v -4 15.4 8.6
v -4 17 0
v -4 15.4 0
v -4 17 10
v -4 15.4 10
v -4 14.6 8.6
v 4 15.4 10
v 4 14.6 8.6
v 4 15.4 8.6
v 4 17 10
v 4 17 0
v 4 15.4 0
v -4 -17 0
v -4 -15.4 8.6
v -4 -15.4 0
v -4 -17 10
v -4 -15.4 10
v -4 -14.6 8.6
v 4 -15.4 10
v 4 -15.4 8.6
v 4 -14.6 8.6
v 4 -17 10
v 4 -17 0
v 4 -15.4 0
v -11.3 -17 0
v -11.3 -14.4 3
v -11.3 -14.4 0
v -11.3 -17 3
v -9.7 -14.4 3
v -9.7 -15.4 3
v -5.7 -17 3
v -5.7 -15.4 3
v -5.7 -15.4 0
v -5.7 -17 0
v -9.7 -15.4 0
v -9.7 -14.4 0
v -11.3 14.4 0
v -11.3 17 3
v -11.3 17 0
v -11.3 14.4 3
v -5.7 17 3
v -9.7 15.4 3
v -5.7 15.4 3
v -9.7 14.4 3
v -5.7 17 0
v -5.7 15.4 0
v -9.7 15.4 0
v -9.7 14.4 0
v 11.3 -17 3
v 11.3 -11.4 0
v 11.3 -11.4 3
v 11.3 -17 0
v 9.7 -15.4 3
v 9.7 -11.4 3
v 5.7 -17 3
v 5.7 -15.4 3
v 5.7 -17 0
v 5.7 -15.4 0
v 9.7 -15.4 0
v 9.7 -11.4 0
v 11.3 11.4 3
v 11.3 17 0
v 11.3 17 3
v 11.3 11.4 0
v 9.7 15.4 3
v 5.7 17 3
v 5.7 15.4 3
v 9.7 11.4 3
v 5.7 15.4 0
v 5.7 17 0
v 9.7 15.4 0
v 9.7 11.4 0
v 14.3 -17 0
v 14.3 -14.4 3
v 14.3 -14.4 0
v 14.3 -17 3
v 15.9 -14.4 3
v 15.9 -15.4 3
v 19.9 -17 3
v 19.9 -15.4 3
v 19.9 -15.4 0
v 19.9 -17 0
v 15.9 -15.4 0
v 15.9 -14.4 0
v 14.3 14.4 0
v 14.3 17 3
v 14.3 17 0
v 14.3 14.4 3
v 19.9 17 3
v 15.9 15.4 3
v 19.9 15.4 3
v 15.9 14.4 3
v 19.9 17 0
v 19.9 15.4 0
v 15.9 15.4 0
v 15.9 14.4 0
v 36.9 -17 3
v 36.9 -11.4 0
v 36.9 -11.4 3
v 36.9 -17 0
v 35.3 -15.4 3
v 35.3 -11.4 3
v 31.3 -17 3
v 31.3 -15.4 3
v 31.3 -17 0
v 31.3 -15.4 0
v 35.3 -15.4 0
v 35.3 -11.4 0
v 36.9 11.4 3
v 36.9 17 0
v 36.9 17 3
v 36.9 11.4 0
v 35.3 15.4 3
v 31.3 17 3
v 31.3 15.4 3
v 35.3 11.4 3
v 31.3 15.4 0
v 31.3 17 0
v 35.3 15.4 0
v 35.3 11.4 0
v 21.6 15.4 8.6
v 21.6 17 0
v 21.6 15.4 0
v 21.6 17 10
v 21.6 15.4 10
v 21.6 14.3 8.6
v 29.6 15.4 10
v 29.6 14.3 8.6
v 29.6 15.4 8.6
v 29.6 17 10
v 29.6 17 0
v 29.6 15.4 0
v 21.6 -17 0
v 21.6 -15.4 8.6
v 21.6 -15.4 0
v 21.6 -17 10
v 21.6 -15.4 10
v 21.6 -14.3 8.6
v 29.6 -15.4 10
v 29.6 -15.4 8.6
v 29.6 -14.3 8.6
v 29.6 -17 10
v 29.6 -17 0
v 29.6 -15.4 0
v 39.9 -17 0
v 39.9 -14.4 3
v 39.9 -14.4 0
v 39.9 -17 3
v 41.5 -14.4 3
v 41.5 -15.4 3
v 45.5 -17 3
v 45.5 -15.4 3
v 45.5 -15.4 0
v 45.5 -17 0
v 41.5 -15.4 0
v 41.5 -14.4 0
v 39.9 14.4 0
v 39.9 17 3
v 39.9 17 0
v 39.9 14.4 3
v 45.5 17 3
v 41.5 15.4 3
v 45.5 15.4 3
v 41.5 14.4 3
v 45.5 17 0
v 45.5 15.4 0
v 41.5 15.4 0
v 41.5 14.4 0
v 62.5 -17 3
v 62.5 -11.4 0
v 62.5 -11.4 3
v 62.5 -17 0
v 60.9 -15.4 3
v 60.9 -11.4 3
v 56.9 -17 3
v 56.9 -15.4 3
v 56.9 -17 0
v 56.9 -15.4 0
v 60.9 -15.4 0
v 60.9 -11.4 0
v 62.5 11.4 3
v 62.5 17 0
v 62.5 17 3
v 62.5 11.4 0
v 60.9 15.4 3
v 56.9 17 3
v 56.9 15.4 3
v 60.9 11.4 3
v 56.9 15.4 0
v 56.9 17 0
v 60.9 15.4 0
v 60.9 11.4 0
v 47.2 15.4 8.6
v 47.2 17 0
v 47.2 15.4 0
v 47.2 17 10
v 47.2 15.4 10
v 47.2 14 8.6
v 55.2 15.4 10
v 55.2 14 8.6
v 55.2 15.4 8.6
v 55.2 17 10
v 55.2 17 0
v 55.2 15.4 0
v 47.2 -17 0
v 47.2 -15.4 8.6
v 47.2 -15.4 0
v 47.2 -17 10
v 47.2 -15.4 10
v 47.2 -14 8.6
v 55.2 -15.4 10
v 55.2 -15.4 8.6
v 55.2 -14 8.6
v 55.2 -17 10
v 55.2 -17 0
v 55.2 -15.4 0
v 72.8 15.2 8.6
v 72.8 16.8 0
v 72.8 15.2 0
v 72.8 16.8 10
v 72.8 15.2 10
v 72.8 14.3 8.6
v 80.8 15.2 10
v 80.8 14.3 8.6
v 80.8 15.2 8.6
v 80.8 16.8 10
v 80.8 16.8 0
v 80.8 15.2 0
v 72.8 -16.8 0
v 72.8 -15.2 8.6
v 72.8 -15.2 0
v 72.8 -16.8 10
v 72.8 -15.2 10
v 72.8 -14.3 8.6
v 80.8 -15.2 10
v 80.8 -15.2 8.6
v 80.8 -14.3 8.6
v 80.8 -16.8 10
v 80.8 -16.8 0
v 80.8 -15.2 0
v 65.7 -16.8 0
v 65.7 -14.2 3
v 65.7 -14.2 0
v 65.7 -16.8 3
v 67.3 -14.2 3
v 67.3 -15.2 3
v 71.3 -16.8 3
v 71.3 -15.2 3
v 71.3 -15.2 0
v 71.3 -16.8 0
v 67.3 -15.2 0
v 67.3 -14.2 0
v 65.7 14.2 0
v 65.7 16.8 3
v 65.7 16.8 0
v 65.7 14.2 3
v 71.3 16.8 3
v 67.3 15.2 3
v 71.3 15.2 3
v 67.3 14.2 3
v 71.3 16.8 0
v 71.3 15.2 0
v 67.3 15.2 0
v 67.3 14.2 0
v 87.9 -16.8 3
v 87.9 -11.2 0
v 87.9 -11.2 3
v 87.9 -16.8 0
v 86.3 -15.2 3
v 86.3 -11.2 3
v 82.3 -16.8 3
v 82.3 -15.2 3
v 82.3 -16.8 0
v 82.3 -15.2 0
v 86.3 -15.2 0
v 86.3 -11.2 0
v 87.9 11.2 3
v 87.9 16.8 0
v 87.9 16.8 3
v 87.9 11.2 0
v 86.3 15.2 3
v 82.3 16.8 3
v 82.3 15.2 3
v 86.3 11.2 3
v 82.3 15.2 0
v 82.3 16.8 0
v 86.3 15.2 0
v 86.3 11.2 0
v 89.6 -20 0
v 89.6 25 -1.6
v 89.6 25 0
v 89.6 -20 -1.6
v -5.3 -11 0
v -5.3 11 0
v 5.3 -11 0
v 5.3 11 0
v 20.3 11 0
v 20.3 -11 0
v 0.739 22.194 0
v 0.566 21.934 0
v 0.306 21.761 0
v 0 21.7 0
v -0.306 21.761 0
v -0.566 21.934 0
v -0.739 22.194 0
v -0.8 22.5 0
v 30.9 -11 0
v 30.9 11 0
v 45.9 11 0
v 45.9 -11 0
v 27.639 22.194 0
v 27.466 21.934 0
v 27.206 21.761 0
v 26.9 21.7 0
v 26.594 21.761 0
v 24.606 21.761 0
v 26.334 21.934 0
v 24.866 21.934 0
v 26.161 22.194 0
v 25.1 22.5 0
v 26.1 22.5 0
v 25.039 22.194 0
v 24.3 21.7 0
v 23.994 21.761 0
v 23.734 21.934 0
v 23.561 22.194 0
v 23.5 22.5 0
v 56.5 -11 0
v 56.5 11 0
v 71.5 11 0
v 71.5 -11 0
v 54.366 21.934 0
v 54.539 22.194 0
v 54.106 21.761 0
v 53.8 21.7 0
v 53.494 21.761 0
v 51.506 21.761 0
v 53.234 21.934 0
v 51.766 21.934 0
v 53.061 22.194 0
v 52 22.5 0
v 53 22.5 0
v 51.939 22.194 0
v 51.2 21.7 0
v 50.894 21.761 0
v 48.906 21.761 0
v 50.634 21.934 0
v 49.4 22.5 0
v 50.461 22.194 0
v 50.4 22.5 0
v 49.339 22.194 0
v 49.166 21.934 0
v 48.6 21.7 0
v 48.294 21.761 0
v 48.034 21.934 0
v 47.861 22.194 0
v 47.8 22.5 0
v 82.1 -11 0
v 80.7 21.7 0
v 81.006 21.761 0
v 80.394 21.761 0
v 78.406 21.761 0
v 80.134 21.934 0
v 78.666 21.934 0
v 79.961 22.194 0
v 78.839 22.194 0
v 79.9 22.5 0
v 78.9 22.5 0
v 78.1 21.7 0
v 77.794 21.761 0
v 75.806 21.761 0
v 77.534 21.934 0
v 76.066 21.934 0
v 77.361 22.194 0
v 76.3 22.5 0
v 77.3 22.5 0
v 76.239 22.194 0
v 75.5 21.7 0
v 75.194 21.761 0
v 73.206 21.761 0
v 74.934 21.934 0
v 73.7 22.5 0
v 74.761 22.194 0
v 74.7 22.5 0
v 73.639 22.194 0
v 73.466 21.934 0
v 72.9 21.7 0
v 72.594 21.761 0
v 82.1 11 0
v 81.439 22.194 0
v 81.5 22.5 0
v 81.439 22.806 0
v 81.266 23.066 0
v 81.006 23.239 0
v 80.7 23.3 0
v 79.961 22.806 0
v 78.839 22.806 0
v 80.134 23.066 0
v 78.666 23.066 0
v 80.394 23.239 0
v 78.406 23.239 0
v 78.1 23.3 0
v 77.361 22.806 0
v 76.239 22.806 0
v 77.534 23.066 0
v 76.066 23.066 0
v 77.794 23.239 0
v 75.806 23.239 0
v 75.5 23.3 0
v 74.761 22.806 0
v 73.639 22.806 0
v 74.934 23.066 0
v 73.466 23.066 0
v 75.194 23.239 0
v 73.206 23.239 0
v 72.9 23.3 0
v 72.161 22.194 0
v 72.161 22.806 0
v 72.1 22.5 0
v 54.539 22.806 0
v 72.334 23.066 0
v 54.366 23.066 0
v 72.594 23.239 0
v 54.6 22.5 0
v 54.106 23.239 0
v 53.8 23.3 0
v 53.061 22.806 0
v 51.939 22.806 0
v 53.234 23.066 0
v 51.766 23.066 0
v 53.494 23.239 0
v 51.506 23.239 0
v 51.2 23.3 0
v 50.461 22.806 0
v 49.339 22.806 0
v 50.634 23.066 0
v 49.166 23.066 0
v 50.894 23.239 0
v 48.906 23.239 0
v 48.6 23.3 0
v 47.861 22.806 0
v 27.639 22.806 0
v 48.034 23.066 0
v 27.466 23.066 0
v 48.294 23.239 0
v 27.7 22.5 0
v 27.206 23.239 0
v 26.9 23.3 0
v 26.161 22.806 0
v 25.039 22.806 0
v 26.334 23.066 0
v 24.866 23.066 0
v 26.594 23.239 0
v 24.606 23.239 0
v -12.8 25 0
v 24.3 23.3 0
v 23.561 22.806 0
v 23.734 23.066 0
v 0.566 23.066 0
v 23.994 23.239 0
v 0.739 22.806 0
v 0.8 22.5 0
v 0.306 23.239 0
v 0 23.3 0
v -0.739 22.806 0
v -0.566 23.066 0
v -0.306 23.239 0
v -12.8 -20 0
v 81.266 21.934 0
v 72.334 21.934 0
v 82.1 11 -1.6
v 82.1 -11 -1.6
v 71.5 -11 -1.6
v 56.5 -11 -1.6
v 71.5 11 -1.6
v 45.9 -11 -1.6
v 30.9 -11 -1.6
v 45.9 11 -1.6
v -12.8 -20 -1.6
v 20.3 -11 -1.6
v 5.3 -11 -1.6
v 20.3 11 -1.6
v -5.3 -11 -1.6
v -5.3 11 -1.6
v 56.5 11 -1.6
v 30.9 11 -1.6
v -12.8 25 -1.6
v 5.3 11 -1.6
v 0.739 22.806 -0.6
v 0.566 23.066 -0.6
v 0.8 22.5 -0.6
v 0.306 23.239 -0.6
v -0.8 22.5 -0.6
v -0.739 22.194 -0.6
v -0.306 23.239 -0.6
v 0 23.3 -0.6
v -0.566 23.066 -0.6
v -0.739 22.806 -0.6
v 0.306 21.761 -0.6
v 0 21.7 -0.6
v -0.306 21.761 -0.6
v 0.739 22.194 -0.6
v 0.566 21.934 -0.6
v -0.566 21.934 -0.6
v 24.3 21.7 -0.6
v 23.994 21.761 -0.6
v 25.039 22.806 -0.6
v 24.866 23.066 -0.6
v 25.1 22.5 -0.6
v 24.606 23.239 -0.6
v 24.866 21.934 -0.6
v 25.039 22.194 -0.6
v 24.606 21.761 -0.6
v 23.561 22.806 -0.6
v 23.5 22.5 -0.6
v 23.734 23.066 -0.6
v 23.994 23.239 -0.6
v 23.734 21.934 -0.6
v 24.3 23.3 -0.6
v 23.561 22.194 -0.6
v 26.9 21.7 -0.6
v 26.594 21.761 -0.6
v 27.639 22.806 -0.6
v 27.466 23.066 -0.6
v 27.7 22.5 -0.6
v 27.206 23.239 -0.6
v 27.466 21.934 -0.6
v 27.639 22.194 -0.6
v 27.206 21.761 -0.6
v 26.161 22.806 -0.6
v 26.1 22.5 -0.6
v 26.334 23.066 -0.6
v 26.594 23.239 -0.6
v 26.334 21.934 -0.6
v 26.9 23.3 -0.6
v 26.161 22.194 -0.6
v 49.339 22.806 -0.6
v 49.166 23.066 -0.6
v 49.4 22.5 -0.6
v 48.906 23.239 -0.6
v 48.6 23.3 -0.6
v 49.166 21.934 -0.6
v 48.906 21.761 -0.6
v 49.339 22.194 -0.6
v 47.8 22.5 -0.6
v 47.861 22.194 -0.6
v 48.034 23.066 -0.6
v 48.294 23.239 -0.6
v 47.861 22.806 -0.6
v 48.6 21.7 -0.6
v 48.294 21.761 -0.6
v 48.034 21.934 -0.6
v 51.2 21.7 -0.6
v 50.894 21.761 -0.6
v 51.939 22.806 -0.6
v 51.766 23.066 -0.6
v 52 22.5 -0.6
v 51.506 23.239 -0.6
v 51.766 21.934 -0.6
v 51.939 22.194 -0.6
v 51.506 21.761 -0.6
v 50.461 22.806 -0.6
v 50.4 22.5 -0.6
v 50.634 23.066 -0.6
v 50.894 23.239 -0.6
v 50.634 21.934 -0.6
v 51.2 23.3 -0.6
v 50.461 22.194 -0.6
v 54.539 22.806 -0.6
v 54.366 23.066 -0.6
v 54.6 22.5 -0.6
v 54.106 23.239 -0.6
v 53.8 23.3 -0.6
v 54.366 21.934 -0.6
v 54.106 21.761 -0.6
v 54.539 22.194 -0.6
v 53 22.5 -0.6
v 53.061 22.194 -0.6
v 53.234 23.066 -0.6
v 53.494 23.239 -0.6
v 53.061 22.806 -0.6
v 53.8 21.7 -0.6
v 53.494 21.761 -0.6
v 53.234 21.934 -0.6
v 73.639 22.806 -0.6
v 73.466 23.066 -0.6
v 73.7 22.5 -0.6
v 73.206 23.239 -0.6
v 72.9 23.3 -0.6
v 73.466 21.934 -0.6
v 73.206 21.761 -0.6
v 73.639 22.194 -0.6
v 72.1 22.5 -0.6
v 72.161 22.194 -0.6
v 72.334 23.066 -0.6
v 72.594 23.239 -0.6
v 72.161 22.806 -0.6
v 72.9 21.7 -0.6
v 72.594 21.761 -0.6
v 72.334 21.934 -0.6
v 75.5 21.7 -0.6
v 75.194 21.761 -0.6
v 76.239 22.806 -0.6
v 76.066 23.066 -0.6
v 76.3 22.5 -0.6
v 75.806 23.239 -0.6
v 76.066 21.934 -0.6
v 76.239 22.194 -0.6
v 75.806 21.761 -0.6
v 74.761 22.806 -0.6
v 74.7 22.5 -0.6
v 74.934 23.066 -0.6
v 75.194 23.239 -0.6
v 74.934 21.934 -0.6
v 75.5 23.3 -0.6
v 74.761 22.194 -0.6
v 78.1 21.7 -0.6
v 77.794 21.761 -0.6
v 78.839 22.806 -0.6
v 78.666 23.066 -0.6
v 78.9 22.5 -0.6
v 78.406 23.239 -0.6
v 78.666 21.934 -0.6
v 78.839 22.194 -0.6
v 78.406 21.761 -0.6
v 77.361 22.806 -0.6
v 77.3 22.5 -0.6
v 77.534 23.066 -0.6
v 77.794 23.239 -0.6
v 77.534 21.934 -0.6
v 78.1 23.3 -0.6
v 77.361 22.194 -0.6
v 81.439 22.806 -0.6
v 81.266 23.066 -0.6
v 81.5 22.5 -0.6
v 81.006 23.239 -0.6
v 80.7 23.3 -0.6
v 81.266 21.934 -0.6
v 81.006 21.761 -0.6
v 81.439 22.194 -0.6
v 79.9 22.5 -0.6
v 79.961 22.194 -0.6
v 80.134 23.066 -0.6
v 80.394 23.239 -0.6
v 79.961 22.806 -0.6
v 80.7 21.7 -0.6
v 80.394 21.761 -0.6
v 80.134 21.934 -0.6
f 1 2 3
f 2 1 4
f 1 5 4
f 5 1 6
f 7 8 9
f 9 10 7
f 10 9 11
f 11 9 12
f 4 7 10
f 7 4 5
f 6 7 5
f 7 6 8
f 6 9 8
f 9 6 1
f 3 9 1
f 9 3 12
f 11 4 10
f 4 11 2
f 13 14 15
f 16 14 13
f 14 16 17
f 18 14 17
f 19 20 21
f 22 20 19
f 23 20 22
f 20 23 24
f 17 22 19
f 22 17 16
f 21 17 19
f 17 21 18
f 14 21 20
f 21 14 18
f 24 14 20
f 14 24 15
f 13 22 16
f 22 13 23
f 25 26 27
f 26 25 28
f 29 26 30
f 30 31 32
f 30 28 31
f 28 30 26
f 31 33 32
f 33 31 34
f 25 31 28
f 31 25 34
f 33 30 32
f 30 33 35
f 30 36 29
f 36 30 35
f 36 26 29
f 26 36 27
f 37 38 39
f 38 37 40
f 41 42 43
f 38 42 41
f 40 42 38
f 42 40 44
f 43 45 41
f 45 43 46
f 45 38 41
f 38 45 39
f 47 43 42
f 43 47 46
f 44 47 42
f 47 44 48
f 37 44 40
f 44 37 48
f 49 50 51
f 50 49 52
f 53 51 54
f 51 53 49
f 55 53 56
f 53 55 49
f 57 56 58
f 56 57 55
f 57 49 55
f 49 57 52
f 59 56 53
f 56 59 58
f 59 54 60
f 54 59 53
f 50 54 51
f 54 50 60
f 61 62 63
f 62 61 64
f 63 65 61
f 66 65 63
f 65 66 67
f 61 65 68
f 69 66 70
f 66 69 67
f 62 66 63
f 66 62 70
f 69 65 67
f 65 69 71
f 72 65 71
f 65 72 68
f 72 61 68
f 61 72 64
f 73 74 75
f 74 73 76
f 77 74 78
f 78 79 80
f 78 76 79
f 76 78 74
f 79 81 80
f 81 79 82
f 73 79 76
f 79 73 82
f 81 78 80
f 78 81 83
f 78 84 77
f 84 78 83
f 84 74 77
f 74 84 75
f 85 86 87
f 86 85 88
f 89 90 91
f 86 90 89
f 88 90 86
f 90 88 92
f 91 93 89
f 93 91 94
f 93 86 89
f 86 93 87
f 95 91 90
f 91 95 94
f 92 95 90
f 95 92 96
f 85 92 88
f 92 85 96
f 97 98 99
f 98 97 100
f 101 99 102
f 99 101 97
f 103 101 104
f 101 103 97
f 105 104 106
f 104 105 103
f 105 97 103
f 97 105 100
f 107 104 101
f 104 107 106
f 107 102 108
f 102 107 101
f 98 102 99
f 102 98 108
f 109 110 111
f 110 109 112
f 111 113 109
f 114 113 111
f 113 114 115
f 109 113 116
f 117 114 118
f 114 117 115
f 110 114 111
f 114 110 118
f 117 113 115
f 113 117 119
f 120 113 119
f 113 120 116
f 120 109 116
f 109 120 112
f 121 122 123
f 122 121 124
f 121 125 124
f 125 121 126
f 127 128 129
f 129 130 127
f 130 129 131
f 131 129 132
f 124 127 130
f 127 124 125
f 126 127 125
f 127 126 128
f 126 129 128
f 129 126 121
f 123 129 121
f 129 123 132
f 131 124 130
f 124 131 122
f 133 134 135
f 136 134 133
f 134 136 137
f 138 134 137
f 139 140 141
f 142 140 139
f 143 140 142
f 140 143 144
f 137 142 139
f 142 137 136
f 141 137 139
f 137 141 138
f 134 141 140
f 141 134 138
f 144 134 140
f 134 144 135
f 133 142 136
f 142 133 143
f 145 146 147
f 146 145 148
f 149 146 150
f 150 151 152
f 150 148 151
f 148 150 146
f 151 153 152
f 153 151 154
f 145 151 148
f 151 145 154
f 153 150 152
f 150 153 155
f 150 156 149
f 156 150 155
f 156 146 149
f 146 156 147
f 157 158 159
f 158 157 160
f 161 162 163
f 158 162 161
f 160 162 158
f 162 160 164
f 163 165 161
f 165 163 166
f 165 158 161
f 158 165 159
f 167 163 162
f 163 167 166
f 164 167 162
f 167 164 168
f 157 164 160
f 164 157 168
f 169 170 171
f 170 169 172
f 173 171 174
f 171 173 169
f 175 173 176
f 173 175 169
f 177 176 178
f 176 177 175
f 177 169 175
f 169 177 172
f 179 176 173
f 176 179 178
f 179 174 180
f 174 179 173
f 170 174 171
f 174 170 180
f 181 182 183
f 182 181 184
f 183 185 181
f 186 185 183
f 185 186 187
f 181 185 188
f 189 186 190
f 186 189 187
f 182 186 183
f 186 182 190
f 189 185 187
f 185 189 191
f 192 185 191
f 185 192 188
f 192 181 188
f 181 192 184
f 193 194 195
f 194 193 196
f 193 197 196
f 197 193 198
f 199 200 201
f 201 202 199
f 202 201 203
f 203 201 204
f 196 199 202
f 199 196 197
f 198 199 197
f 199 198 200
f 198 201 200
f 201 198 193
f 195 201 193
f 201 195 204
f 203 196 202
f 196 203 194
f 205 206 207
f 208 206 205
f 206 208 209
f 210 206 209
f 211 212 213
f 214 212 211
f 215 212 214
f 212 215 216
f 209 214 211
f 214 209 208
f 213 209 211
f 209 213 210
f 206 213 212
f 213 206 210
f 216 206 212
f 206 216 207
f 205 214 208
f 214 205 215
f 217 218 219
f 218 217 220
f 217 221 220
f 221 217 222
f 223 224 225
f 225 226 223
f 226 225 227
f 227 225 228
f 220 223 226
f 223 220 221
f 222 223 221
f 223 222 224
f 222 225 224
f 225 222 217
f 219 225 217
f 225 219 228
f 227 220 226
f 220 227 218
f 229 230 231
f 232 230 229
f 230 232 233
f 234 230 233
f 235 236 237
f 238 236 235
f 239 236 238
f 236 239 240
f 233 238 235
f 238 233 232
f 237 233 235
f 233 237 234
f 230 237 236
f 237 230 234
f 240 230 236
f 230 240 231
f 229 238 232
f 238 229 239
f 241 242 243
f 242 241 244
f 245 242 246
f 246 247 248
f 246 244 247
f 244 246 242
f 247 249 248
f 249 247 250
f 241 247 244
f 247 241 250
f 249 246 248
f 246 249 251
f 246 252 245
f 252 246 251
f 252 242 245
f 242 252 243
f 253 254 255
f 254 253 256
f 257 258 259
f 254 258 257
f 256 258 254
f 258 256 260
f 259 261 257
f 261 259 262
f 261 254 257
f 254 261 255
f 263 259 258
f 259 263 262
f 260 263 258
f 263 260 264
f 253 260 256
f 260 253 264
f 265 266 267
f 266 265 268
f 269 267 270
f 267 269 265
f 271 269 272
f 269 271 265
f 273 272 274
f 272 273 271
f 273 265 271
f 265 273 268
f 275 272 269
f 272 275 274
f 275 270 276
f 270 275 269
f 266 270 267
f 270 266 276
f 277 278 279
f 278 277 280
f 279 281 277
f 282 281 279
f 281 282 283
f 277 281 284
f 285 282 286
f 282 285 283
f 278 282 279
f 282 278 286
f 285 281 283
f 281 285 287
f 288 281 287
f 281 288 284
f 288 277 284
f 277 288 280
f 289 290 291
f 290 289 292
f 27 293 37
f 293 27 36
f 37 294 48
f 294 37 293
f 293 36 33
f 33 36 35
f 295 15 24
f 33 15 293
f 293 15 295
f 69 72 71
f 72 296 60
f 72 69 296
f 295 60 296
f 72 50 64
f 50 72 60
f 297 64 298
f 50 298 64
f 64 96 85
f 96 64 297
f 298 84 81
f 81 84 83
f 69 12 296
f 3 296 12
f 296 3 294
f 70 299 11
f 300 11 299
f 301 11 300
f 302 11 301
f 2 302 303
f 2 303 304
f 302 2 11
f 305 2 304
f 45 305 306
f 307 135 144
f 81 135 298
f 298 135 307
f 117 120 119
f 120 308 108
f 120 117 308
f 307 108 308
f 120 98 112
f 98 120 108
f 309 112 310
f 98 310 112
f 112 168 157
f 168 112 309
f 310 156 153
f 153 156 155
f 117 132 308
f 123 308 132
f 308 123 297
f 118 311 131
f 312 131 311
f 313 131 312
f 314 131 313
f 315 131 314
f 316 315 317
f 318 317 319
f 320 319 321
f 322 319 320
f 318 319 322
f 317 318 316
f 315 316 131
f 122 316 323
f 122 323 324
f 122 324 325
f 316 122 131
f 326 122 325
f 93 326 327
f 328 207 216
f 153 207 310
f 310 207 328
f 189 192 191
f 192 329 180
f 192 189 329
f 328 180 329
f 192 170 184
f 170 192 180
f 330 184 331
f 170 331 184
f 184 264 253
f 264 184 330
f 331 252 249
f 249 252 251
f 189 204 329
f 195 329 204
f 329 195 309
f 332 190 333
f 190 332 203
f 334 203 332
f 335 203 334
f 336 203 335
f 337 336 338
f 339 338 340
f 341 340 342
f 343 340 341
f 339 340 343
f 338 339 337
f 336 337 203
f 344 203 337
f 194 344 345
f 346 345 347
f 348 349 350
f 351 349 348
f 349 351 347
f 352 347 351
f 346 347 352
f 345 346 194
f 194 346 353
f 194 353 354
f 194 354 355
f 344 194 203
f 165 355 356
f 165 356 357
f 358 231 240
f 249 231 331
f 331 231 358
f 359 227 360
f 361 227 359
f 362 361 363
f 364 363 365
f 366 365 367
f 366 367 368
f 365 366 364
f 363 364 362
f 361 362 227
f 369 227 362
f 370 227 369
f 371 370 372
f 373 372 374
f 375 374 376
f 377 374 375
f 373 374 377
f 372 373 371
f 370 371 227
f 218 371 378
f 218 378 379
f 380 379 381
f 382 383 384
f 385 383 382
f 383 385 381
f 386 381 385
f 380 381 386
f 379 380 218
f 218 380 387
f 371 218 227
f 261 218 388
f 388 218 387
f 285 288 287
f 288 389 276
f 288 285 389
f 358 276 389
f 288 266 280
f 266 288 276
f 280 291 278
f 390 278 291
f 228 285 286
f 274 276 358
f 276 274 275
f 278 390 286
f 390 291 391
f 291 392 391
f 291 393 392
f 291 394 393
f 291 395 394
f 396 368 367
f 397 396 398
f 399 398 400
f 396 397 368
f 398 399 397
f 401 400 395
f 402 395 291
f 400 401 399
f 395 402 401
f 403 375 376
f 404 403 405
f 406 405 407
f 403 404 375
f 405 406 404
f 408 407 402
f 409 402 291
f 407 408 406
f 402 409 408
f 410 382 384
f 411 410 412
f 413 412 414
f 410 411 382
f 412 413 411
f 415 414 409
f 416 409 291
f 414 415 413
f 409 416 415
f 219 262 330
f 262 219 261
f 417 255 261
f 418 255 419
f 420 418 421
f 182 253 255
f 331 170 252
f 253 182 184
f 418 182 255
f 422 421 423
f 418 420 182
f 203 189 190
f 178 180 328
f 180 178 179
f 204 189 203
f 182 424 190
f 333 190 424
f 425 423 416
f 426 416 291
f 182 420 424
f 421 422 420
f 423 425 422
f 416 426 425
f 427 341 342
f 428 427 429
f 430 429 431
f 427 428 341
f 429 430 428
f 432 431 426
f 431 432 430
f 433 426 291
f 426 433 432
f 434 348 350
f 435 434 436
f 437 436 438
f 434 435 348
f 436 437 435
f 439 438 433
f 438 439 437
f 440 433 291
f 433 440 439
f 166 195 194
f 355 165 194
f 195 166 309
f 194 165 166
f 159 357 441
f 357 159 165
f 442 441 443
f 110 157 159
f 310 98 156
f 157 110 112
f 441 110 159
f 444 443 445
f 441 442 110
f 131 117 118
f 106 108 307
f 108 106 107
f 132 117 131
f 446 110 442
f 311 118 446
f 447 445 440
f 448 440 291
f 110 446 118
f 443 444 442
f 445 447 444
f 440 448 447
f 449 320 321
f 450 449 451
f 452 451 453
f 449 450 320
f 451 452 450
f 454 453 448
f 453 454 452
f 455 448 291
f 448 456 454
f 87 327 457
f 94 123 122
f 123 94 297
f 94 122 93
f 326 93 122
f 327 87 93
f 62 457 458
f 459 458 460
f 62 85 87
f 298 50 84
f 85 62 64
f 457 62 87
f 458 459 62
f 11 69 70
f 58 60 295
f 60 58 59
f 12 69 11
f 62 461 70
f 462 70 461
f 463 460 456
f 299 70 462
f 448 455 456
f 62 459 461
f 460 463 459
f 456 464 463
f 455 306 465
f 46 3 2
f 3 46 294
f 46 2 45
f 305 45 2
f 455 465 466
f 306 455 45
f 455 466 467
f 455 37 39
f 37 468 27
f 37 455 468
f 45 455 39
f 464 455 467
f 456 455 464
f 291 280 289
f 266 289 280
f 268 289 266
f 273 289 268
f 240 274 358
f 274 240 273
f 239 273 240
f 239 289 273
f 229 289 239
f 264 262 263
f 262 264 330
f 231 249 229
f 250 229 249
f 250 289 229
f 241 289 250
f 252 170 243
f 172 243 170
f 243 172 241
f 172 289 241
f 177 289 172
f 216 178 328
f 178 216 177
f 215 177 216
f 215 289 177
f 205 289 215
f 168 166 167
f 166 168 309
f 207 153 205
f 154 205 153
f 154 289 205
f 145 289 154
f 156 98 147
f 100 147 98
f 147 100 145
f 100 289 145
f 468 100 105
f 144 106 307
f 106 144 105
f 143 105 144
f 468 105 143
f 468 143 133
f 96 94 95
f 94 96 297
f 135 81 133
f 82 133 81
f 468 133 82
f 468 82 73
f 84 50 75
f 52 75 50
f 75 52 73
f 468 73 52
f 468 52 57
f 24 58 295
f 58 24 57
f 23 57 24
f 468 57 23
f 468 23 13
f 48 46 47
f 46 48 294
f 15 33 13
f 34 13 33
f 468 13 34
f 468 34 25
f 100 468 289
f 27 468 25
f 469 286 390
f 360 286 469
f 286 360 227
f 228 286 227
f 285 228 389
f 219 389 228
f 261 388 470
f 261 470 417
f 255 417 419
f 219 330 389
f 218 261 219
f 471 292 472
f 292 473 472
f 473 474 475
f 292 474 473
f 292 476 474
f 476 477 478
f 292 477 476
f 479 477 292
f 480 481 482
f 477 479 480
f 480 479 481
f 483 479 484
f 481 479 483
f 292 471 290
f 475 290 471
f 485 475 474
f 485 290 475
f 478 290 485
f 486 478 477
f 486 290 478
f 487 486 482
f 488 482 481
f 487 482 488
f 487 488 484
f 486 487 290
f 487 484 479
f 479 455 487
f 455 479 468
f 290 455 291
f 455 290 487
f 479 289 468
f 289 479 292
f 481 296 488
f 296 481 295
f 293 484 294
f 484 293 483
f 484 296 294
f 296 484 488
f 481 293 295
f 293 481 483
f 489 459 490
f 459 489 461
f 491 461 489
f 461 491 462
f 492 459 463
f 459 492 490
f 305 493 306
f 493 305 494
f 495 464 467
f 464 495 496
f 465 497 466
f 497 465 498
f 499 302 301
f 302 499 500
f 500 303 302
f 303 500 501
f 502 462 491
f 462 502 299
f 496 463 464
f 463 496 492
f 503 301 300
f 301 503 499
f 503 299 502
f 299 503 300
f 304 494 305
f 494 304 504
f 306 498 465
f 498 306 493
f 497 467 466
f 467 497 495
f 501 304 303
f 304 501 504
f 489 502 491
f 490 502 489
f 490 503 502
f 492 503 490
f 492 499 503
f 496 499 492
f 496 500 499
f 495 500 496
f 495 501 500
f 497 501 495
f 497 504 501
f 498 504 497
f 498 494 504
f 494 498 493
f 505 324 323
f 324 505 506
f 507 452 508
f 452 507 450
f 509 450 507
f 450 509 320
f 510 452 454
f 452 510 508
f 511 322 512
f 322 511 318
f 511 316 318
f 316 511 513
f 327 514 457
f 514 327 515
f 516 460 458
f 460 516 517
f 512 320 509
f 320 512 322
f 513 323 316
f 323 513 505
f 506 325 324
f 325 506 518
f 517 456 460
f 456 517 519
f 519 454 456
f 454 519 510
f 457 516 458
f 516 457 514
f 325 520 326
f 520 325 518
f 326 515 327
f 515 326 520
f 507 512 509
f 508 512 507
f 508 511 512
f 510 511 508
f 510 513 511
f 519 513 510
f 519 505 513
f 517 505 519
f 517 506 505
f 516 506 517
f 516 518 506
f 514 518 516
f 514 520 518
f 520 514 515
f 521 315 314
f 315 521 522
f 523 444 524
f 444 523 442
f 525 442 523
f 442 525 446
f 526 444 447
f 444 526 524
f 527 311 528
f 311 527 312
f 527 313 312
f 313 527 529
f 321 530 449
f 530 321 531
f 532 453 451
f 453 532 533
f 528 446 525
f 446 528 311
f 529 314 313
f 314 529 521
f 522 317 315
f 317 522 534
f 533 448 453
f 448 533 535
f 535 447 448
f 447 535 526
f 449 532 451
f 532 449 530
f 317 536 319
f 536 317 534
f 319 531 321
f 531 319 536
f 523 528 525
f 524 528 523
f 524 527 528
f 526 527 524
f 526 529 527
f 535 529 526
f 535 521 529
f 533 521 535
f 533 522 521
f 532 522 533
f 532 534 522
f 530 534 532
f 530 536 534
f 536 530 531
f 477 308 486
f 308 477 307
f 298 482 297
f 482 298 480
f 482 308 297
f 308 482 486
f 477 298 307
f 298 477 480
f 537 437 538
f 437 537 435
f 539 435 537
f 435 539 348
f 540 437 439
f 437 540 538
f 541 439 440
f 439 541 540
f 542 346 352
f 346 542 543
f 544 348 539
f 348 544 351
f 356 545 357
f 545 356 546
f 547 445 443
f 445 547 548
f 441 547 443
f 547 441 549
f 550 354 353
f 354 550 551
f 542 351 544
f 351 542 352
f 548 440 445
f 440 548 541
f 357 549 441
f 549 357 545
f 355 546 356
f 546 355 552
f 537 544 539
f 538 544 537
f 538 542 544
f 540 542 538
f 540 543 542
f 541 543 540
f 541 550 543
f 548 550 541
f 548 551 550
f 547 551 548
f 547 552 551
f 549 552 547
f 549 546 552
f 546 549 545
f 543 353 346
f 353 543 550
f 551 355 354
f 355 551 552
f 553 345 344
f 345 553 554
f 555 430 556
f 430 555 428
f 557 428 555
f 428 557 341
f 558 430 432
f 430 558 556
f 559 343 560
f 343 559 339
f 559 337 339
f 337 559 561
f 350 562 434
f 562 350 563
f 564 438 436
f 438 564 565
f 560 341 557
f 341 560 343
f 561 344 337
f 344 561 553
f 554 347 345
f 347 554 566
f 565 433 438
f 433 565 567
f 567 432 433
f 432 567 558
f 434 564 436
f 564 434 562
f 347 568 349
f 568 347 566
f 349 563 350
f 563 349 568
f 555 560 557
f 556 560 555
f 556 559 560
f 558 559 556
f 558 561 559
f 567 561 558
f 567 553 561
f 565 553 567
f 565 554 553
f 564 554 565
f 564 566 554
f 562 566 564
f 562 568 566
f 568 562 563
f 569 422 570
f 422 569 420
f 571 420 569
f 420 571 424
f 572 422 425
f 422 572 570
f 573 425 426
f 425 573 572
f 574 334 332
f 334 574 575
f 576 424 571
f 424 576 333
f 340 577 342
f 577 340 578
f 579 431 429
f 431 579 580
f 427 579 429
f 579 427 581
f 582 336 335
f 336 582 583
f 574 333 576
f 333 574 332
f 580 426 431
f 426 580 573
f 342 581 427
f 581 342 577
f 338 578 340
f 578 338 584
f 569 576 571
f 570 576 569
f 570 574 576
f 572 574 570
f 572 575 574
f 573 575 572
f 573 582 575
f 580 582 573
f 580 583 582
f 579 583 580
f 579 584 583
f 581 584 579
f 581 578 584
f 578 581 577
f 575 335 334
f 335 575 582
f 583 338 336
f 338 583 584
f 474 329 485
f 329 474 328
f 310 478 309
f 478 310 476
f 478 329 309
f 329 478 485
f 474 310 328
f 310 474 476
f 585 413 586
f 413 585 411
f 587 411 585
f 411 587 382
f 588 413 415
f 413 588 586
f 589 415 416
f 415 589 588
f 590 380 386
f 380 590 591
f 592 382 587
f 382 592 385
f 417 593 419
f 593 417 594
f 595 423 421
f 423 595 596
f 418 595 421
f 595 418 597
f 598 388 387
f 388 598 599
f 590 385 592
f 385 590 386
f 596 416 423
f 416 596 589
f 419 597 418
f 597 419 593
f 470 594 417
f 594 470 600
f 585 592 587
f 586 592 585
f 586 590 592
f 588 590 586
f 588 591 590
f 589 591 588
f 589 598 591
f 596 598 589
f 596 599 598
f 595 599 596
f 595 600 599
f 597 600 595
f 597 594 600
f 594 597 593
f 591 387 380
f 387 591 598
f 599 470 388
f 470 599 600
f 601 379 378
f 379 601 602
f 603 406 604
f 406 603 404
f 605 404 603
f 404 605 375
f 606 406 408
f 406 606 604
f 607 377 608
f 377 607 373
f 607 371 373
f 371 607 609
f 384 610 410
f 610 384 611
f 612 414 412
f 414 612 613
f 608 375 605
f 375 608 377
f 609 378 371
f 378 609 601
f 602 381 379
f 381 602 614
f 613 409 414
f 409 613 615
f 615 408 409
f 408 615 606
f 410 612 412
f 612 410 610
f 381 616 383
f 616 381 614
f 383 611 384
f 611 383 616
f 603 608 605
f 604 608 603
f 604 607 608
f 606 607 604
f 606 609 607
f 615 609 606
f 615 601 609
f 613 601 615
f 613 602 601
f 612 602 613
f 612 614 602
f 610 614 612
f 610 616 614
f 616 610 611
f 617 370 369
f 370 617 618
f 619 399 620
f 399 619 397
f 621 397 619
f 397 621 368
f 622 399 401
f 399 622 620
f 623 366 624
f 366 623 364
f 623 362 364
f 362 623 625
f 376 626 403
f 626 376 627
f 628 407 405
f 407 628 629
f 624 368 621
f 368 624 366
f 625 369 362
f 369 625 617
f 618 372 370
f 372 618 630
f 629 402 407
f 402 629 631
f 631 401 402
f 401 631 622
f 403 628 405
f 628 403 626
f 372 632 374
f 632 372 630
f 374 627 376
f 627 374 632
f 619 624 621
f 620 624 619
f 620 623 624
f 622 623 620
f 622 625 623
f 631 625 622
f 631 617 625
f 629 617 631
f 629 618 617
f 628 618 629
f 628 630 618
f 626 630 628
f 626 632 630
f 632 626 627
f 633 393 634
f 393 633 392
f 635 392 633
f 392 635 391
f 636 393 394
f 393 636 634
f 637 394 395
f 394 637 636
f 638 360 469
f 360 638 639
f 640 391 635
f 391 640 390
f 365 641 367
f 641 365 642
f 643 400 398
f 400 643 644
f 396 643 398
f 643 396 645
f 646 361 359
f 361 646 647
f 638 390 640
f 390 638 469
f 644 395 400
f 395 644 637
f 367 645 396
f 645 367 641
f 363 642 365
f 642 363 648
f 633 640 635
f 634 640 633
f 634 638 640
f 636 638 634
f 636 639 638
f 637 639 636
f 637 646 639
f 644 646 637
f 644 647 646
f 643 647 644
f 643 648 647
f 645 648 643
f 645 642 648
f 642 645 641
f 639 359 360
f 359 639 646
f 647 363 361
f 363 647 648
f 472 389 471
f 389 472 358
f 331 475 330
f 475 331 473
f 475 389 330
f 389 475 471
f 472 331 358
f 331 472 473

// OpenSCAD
// file: ../../util/marks.scad
//-----------------------------------------------------------------------
// Marks for fit pieces: n dots in a row, engraved into a face, so each
// variant can be told apart after printing. Origin: centre of the row, on
// the face; the dots cut down into -Z. Units: mm.
//-----------------------------------------------------------------------

markDotDia   = 1.6;
markDotPitch = 2.6;
markDotDepth = 0.6;

module markDots(n)
{
  for (i = [0 : n - 1])
    translate([(i - (n - 1)/2)*markDotPitch, 0, -markDotDepth])
      cylinder(d = markDotDia, h = markDotDepth + 1, $fn = 16);
}
// file: wago-221.scad
//-----------------------------------------------------------------------
// WAGO 221 lever connector, held in a snap clip on the floor
//
// Push it down between two arms: the WAGO presses on the sloped lead-ins,
// the arms flex outward, and their hooks snap over its top edge at each
// short end. L-shaped corner stops locate the footprint. The wire-entry face
// is left open, with only a short stub at each corner so the outer ports
// stay clear. Lift the hooks with a fingernail to take it out.
//
// Three modules, all in the same frame:
//   wagoGhost()   the connector, for previews
//   wagoClip()    the plastic: two arms with hooks and four corner stops
//   wagoBody()    the connector as a plain solid (views, collision checks)
//
// Frame: origin on the floor top, at the centre of the WAGO's footprint.
// +X from the wire-entry face to the back (entries face -X), Y along the row
// of levers (the short ends at +-Y), Z up. Units: mm.
//
// Sizes: "221-412", "221-413", "221-415" (4 mm², 2/3/5 way), "221-425" (same
// body as the 415), "221-612", "221-613", "221-615" (6 mm²). Select by name;
// wagoSize(name) gives the row of wagoSizes.
//
// Use with `use <.../components/wago-221/wago-221.scad>`.
//-----------------------------------------------------------------------

//-- [name, length (Y), depth (X), height levers closed, ports, strip length, max mm²]
//-- WAGO data sheets unless noted; see the README for each source
wagoSizes = [
  ["221-412", 13.2, 18.8, 8.6, 2, 11, 4],     // data sheet 03.10.2022 (brochure: 13.1 x 18.6 x 8.3)
  ["221-413", 18.7, 18.6, 8.3, 3, 11, 4],     // WAGO UK brochure, no data sheet found: CAL
  ["221-415", 30.0, 18.6, 8.4, 5, 11, 4],     // data sheet 19.04.2025; measured on a 221-425, controller project
  ["221-425", 30.0, 18.6, 8.4, 5, 11, 4],     // Green Range 415: measured 2026-10 (the controller project's base)
  ["221-612", 16.0, 21.1, 10.1, 2, 13, 6],    // data sheet 12.05.2023 (strip 12-14)
  ["221-613", 22.9, 21.1, 10.1, 3, 13, 6],    // data sheet 04.04.2025
  ["221-615", 36.7, 21.1, 10.1, 5, 13, 6],    // data sheet 07.04.2025
];

function wagoSize(name) = let (i = search([name], wagoSizes)[0])
  assert(i != [] && i != undef, str("unknown WAGO ", name)) wagoSizes[i];
function wagoLength(name) = wagoSize(name)[1];
function wagoDepth(name)  = wagoSize(name)[2];
function wagoHeight(name) = wagoSize(name)[3];
function wagoPorts(name)  = wagoSize(name)[4];
function wagoStrip(name)  = wagoSize(name)[5];

wagoDefault    = "221-415";

//-- The clip
wagoClearance  = 0.4;     // each end and side, footprint to arm / stop (controller base fitClearance)
wagoHook       = 0.7;     // CAL: how far each hook reaches in over the WAGO's top edge. Set by the fit piece
wagoHookGap    = 0.2;     // WAGO top to the hook's flat underside
wagoLeadIn     = 1.4;     // height of the sloped lead-in above the hook
wagoArmThick   = 1.6;     // PETG arm (controller base); flexes outward by the hook to let the WAGO in
wagoArmWidth   = 8;       // across X, centred on the depth
wagoStopH      = 3;       // corner stops, above the floor
wagoStopLeg    = 4;       // stop legs along the ends and the back
wagoStopWall   = 1.6;
wagoEntryStub  = 1.0;     // stop leg along the entry face: short, clear of the outer port

//-- height of the clip above the floor: room needed under a lid (the levers open to
//-- about 20 above the floor, CAL; you only open them with the WAGO out of the clip)
function wagoClipHeight(name = wagoDefault) = wagoHeight(name) + wagoHookGap + wagoLeadIn;

module wagoBody(name = wagoDefault)
{
  translate([-wagoDepth(name)/2, -wagoLength(name)/2, 0])
    cube([wagoDepth(name), wagoLength(name), wagoHeight(name)]);
}

module wagoGhost(name = wagoDefault)
{
  L = wagoLength(name); D = wagoDepth(name); H = wagoHeight(name); n = wagoPorts(name);
  %color("Orange") difference()
  {
    wagoBody(name);
    //-- a conductor entry per port, on the -X face
    for (i = [0 : n - 1])
      translate([-D/2 - 1, (i - (n - 1)/2)*L/n, H*0.4]) rotate([0, 90, 0]) cylinder(d = L/n*0.55, h = 6, $fn = 16);
  }
}

module wagoClip(name = wagoDefault, clearance = wagoClearance, hook = wagoHook)
{
  L = wagoLength(name); D = wagoDepth(name);
  c = clearance;
  H = wagoHeight(name) + wagoHookGap;           // hook underside
  t = wagoArmThick;
  reach = c + hook;                             // hook tip past the arm's inner face
  leg = min(wagoStopLeg, D/2 - wagoArmWidth/2 - 0.8);   // stays clear of the arm, so it flexes
  assert(leg >= 1.5, "WAGO too shallow for the corner stops beside the arms");

  //-- arms: inner face at L/2 + c, hook toward the WAGO, free from the floor so they flex
  for (m = [0, 1])
    mirror([0, m, 0])
      translate([-wagoArmWidth/2, L/2 + c, -0.01])
        rotate([90, 0, 90]) linear_extrude(wagoArmWidth)
          polygon([[0, 0], [t, 0], [t, H + 0.01 + wagoLeadIn], [0, H + 0.01 + wagoLeadIn],
                   [-reach, H + 0.01], [0, H + 0.01]]);
  //-- corner stops, outside the footprint: a leg along each end, one along the back,
  //-- and a short stub along the entry face
  for (sx = [-1, 1], sy = [-1, 1])
    translate([sx*(D/2 + c), sy*(L/2 + c), -0.01])
      mirror([sx < 0 ? 1 : 0, 0, 0]) mirror([0, sy < 0 ? 1 : 0, 0])
      {
        //-- along the end (Y face): from the corner inward in -X
        translate([-leg, 0, 0]) cube([leg + wagoStopWall, wagoStopWall, wagoStopH + 0.01]);
        //-- along the side (X face): from the corner inward in -Y
        sideLeg = sx < 0 ? wagoEntryStub : leg;
        translate([0, -sideLeg, 0]) cube([wagoStopWall, sideLeg + wagoStopWall, wagoStopH + 0.01]);
      }
}
// main file
//-----------------------------------------------------------------------
// Fit piece: four clips for a 221-415 on one open floor, marked 1 to 4 dots
// at the end of each. Push a WAGO down into each until the hooks snap over.
// Then try to lift it out by the levers, and prise a hook off.
//
//   1  hook 0.4, clearance 0.4
//   2  hook 0.7, clearance 0.4
//   3  hook 1.0, clearance 0.4
//   4  hook 0.7, clearance 0.2
//
// The floor is a frame (open under each WAGO) to save plastic. Set `name`
// for another size. Prints base down, as exported, no supports. Units: mm.
//-----------------------------------------------------------------------

use <wago-221.scad>
use <../../util/marks.scad>

name      = "221-415";
baseThick = 1.6;
rim       = 4;       // solid floor round each clip
markRoom  = 5;       // floor past one end for the dots

stations  = [ [0.4, 0.4], [0.4, 0.7], [0.4, 1.0], [0.2, 0.7] ];   // [clearance, hook]

L = wagoLength(name);
D = wagoDepth(name);
n = len(stations);
pitch = D + 2*(0.4 + 1.6) + 3;
fy0 = -L/2 - 0.4 - 1.6 - rim + 1;
fy1 =  L/2 + 0.4 + 1.6 + rim - 1 + markRoom;
fx0 = -pitch/2;

difference()
{
  union()
  {
    translate([fx0, fy0, -baseThick]) cube([n*pitch, fy1 - fy0, baseThick]);
    for (i = [0 : n - 1])
      translate([i*pitch, 0, 0]) wagoClip(name, clearance = stations[i][0], hook = stations[i][1]);
  }
  for (i = [0 : n - 1])
    translate([i*pitch, 0, 0])
    {
      //-- open floor under the WAGO, leaving a rim round it and under the stops
      translate([-D/2 + rim, -L/2 + rim, -baseThick - 1]) cube([D - 2*rim, L - 2*rim, baseThick + 2]);
      translate([0, fy1 - markRoom/2, 0]) markDots(i + 1);
    }
}

if ($preview)
  for (i = [0 : n - 1]) translate([i*pitch, 0, 0]) wagoGhost(name);
